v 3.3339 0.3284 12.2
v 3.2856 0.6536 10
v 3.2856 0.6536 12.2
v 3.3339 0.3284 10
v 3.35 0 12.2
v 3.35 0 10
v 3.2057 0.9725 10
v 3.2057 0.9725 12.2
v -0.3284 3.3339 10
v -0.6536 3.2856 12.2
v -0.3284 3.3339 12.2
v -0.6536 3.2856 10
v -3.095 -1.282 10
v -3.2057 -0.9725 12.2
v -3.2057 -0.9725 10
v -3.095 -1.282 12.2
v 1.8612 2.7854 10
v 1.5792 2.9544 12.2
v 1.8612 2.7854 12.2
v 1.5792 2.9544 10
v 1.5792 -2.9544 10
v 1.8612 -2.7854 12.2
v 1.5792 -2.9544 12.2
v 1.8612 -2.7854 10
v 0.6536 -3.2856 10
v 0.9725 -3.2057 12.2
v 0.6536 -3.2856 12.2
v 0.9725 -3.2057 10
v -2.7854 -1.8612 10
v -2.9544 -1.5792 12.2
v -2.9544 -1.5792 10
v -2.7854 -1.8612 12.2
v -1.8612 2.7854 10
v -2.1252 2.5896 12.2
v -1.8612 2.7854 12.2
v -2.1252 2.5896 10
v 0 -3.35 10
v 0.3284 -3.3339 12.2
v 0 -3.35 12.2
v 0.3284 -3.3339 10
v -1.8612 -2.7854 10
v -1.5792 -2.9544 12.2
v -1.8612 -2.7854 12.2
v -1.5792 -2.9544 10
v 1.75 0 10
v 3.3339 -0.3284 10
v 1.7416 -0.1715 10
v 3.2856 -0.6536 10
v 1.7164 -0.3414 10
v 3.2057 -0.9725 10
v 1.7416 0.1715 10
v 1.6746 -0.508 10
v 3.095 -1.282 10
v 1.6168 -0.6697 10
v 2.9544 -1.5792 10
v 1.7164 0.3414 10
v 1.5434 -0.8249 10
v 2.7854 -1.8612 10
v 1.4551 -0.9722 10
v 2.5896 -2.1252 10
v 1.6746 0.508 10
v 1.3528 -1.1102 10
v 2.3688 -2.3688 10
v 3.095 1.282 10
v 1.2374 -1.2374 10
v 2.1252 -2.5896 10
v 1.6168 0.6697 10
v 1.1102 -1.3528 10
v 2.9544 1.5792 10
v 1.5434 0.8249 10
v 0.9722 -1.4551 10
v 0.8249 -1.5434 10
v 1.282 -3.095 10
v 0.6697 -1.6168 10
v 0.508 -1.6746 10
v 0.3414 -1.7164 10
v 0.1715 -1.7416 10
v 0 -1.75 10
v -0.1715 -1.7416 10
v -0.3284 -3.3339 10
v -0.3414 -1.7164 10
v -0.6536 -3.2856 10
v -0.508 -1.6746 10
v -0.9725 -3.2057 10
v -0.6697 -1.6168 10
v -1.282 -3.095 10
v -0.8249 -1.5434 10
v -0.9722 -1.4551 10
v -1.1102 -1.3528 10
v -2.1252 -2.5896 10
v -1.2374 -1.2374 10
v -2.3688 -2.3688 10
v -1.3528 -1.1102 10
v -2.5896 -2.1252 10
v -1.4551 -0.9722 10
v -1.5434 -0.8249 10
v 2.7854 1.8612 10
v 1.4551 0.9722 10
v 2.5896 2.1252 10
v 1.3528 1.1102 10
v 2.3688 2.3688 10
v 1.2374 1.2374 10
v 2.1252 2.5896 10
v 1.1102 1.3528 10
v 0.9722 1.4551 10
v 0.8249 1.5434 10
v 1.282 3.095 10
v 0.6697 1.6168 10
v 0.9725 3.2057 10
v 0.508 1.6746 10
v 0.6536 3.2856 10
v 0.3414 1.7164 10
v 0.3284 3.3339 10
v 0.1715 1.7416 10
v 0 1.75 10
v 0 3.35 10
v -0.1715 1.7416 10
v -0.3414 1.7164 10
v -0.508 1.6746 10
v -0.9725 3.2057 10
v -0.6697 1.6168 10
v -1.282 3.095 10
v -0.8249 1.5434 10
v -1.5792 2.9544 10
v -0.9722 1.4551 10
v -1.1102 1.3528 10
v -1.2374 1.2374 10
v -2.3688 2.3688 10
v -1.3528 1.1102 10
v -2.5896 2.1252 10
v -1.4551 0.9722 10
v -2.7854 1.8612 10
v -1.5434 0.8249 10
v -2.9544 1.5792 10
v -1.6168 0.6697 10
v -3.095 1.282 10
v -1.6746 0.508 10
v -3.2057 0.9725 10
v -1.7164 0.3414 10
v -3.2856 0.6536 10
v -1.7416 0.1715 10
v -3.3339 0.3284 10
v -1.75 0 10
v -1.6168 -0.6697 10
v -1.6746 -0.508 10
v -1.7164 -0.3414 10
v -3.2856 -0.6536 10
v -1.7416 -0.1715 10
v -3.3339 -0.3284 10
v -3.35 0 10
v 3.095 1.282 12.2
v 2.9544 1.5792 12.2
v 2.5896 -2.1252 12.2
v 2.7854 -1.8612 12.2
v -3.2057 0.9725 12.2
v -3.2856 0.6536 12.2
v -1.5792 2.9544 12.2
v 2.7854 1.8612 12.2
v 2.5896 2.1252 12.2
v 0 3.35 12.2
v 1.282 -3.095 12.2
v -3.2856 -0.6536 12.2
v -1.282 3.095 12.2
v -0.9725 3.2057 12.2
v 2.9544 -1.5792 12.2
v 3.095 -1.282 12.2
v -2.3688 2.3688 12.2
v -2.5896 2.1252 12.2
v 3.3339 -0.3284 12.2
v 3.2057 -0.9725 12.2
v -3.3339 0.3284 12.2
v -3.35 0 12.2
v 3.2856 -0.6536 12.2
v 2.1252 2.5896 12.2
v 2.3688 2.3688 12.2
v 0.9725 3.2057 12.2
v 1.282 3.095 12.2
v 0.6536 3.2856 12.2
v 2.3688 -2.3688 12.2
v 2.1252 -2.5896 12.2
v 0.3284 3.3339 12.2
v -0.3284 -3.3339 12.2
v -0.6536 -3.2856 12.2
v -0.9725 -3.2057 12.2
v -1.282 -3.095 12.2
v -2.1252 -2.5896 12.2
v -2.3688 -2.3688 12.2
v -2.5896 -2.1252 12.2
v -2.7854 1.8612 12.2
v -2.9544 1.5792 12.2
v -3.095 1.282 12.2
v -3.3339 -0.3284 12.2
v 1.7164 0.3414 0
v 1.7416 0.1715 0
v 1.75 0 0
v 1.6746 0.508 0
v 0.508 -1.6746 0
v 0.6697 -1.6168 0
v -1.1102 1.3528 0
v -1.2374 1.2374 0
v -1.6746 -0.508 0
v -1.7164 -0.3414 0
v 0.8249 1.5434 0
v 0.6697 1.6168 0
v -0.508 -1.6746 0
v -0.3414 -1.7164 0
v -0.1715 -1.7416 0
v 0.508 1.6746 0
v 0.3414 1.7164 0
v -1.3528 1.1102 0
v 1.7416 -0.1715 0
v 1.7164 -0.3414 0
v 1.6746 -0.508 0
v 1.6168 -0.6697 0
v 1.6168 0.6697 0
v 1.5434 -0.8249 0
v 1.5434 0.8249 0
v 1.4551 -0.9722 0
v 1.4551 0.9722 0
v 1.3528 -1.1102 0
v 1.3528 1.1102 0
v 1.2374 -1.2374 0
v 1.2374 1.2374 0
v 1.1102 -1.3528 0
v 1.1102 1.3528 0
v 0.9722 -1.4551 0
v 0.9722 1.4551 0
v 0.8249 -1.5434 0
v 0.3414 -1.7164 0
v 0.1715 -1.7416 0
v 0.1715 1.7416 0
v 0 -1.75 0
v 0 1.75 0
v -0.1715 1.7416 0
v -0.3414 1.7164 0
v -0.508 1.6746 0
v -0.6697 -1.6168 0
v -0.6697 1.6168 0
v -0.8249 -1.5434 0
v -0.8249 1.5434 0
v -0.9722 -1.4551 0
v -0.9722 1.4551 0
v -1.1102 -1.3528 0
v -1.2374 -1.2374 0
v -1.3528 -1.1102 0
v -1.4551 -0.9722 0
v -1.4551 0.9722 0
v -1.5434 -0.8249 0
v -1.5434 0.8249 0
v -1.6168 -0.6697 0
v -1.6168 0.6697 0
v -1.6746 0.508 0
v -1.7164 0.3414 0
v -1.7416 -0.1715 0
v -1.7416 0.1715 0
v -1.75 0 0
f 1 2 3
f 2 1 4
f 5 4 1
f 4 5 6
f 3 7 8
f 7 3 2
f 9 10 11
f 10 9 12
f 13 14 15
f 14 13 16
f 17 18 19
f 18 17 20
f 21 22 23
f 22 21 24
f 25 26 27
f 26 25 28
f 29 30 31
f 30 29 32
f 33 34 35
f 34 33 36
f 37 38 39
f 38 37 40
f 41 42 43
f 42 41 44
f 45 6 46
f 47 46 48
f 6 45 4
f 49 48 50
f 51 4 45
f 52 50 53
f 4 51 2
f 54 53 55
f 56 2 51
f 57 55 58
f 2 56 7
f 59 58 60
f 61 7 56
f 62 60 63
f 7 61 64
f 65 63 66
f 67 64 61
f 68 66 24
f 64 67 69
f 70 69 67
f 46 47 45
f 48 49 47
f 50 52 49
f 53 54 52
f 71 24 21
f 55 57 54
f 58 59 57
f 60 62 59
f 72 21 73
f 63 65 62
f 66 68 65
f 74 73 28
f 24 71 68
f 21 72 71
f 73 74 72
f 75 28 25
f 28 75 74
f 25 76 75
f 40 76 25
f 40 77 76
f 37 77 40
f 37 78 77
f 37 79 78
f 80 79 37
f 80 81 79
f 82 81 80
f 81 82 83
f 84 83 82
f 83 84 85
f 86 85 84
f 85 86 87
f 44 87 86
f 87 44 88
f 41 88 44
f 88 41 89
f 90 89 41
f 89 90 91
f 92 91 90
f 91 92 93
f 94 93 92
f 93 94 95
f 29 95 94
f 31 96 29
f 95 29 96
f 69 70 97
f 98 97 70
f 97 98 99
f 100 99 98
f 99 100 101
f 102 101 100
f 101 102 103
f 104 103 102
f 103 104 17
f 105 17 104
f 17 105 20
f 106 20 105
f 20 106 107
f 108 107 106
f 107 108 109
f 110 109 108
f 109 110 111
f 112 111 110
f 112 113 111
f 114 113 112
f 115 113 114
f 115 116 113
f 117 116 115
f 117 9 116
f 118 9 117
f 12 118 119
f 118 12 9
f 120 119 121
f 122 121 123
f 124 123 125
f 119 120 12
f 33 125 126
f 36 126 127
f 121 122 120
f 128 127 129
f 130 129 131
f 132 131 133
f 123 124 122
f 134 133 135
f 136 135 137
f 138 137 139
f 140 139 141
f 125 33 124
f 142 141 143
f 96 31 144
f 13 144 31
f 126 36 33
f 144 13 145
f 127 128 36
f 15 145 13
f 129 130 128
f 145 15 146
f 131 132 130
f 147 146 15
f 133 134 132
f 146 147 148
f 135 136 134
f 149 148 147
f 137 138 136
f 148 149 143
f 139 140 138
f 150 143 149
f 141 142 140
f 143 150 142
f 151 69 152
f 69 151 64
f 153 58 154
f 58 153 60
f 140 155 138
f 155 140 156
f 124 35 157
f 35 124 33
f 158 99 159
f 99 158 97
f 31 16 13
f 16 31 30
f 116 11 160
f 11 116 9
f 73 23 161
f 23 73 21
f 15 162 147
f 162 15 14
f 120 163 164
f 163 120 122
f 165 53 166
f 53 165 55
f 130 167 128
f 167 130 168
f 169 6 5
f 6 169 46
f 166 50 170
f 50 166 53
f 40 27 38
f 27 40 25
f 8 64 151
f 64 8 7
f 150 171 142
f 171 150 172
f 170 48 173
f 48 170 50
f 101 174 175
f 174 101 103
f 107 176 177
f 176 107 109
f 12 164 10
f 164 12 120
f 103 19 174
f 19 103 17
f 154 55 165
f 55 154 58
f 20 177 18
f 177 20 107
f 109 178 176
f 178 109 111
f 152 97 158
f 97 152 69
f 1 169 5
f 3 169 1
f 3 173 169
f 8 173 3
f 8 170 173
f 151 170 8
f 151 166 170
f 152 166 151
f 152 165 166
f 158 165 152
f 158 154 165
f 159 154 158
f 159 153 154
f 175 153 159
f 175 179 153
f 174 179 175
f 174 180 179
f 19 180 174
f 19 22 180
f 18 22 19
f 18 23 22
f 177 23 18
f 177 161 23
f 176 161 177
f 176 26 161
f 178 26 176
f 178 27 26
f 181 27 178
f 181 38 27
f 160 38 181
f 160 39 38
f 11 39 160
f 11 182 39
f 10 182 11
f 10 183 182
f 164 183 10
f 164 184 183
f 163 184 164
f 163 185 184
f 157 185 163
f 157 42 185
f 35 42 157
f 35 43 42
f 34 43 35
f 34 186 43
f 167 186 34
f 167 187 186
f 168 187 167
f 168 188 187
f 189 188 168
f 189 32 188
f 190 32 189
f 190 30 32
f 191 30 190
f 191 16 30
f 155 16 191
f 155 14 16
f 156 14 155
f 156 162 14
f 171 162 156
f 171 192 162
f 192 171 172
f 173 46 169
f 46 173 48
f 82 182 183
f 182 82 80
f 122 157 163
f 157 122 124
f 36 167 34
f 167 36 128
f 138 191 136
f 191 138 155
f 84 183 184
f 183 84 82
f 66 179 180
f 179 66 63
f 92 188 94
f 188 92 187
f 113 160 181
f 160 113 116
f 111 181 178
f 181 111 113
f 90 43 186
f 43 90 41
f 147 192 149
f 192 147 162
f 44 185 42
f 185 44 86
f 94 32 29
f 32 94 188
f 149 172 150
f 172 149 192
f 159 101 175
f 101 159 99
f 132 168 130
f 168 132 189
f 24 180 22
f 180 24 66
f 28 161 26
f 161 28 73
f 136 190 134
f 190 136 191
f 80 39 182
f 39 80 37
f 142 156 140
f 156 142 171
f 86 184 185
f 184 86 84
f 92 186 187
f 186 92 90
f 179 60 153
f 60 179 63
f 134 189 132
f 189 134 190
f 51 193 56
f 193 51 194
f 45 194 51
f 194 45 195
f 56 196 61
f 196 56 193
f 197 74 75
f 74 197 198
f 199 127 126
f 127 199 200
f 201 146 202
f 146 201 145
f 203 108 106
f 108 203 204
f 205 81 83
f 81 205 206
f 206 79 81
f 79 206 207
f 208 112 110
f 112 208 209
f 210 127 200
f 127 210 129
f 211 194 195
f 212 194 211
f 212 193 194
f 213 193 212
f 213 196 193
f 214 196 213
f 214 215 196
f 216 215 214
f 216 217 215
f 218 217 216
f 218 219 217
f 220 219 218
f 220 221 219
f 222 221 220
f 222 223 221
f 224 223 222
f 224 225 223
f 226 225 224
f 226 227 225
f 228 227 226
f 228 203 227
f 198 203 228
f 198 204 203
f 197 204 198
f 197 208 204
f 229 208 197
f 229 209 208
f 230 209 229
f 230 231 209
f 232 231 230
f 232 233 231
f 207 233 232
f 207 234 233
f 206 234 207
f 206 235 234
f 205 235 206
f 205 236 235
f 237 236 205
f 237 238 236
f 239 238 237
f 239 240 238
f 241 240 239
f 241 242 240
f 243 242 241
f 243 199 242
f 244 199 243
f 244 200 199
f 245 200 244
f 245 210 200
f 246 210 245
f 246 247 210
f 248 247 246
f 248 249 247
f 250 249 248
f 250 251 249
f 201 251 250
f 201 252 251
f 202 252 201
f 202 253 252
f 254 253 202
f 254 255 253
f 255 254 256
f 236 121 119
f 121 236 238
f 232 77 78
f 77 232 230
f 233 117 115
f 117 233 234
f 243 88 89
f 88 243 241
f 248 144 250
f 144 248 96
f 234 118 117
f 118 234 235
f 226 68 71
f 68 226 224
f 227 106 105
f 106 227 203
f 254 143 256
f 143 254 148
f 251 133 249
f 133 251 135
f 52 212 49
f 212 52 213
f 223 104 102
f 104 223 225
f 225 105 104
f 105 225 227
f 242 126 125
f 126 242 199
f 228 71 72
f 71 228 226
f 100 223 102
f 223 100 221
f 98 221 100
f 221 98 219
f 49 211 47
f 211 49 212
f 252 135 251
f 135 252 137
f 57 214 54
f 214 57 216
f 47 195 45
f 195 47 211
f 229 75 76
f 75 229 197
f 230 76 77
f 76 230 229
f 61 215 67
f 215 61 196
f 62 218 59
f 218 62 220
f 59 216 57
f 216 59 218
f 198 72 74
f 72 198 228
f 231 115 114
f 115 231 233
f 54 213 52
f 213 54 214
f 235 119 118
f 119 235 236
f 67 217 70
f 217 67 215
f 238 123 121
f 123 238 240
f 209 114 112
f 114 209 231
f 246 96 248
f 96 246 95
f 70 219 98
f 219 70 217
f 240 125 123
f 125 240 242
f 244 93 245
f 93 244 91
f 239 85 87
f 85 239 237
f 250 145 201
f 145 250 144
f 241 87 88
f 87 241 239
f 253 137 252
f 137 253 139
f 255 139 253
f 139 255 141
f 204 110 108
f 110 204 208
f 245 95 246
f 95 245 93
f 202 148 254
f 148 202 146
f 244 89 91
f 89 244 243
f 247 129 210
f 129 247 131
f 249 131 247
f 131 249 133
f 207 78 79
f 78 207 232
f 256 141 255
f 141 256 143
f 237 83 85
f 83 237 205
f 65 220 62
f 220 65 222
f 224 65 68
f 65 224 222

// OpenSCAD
module pan_head_screw() {
    union() {
        // Screw head
        translate([0, 0, 10])
            cylinder(h=2.2, d=6.7, $fn=64);
        
        // Screw shaft
        cylinder(h=10, d=3.5, $fn=64);
    }
}

pan_head_screw();
